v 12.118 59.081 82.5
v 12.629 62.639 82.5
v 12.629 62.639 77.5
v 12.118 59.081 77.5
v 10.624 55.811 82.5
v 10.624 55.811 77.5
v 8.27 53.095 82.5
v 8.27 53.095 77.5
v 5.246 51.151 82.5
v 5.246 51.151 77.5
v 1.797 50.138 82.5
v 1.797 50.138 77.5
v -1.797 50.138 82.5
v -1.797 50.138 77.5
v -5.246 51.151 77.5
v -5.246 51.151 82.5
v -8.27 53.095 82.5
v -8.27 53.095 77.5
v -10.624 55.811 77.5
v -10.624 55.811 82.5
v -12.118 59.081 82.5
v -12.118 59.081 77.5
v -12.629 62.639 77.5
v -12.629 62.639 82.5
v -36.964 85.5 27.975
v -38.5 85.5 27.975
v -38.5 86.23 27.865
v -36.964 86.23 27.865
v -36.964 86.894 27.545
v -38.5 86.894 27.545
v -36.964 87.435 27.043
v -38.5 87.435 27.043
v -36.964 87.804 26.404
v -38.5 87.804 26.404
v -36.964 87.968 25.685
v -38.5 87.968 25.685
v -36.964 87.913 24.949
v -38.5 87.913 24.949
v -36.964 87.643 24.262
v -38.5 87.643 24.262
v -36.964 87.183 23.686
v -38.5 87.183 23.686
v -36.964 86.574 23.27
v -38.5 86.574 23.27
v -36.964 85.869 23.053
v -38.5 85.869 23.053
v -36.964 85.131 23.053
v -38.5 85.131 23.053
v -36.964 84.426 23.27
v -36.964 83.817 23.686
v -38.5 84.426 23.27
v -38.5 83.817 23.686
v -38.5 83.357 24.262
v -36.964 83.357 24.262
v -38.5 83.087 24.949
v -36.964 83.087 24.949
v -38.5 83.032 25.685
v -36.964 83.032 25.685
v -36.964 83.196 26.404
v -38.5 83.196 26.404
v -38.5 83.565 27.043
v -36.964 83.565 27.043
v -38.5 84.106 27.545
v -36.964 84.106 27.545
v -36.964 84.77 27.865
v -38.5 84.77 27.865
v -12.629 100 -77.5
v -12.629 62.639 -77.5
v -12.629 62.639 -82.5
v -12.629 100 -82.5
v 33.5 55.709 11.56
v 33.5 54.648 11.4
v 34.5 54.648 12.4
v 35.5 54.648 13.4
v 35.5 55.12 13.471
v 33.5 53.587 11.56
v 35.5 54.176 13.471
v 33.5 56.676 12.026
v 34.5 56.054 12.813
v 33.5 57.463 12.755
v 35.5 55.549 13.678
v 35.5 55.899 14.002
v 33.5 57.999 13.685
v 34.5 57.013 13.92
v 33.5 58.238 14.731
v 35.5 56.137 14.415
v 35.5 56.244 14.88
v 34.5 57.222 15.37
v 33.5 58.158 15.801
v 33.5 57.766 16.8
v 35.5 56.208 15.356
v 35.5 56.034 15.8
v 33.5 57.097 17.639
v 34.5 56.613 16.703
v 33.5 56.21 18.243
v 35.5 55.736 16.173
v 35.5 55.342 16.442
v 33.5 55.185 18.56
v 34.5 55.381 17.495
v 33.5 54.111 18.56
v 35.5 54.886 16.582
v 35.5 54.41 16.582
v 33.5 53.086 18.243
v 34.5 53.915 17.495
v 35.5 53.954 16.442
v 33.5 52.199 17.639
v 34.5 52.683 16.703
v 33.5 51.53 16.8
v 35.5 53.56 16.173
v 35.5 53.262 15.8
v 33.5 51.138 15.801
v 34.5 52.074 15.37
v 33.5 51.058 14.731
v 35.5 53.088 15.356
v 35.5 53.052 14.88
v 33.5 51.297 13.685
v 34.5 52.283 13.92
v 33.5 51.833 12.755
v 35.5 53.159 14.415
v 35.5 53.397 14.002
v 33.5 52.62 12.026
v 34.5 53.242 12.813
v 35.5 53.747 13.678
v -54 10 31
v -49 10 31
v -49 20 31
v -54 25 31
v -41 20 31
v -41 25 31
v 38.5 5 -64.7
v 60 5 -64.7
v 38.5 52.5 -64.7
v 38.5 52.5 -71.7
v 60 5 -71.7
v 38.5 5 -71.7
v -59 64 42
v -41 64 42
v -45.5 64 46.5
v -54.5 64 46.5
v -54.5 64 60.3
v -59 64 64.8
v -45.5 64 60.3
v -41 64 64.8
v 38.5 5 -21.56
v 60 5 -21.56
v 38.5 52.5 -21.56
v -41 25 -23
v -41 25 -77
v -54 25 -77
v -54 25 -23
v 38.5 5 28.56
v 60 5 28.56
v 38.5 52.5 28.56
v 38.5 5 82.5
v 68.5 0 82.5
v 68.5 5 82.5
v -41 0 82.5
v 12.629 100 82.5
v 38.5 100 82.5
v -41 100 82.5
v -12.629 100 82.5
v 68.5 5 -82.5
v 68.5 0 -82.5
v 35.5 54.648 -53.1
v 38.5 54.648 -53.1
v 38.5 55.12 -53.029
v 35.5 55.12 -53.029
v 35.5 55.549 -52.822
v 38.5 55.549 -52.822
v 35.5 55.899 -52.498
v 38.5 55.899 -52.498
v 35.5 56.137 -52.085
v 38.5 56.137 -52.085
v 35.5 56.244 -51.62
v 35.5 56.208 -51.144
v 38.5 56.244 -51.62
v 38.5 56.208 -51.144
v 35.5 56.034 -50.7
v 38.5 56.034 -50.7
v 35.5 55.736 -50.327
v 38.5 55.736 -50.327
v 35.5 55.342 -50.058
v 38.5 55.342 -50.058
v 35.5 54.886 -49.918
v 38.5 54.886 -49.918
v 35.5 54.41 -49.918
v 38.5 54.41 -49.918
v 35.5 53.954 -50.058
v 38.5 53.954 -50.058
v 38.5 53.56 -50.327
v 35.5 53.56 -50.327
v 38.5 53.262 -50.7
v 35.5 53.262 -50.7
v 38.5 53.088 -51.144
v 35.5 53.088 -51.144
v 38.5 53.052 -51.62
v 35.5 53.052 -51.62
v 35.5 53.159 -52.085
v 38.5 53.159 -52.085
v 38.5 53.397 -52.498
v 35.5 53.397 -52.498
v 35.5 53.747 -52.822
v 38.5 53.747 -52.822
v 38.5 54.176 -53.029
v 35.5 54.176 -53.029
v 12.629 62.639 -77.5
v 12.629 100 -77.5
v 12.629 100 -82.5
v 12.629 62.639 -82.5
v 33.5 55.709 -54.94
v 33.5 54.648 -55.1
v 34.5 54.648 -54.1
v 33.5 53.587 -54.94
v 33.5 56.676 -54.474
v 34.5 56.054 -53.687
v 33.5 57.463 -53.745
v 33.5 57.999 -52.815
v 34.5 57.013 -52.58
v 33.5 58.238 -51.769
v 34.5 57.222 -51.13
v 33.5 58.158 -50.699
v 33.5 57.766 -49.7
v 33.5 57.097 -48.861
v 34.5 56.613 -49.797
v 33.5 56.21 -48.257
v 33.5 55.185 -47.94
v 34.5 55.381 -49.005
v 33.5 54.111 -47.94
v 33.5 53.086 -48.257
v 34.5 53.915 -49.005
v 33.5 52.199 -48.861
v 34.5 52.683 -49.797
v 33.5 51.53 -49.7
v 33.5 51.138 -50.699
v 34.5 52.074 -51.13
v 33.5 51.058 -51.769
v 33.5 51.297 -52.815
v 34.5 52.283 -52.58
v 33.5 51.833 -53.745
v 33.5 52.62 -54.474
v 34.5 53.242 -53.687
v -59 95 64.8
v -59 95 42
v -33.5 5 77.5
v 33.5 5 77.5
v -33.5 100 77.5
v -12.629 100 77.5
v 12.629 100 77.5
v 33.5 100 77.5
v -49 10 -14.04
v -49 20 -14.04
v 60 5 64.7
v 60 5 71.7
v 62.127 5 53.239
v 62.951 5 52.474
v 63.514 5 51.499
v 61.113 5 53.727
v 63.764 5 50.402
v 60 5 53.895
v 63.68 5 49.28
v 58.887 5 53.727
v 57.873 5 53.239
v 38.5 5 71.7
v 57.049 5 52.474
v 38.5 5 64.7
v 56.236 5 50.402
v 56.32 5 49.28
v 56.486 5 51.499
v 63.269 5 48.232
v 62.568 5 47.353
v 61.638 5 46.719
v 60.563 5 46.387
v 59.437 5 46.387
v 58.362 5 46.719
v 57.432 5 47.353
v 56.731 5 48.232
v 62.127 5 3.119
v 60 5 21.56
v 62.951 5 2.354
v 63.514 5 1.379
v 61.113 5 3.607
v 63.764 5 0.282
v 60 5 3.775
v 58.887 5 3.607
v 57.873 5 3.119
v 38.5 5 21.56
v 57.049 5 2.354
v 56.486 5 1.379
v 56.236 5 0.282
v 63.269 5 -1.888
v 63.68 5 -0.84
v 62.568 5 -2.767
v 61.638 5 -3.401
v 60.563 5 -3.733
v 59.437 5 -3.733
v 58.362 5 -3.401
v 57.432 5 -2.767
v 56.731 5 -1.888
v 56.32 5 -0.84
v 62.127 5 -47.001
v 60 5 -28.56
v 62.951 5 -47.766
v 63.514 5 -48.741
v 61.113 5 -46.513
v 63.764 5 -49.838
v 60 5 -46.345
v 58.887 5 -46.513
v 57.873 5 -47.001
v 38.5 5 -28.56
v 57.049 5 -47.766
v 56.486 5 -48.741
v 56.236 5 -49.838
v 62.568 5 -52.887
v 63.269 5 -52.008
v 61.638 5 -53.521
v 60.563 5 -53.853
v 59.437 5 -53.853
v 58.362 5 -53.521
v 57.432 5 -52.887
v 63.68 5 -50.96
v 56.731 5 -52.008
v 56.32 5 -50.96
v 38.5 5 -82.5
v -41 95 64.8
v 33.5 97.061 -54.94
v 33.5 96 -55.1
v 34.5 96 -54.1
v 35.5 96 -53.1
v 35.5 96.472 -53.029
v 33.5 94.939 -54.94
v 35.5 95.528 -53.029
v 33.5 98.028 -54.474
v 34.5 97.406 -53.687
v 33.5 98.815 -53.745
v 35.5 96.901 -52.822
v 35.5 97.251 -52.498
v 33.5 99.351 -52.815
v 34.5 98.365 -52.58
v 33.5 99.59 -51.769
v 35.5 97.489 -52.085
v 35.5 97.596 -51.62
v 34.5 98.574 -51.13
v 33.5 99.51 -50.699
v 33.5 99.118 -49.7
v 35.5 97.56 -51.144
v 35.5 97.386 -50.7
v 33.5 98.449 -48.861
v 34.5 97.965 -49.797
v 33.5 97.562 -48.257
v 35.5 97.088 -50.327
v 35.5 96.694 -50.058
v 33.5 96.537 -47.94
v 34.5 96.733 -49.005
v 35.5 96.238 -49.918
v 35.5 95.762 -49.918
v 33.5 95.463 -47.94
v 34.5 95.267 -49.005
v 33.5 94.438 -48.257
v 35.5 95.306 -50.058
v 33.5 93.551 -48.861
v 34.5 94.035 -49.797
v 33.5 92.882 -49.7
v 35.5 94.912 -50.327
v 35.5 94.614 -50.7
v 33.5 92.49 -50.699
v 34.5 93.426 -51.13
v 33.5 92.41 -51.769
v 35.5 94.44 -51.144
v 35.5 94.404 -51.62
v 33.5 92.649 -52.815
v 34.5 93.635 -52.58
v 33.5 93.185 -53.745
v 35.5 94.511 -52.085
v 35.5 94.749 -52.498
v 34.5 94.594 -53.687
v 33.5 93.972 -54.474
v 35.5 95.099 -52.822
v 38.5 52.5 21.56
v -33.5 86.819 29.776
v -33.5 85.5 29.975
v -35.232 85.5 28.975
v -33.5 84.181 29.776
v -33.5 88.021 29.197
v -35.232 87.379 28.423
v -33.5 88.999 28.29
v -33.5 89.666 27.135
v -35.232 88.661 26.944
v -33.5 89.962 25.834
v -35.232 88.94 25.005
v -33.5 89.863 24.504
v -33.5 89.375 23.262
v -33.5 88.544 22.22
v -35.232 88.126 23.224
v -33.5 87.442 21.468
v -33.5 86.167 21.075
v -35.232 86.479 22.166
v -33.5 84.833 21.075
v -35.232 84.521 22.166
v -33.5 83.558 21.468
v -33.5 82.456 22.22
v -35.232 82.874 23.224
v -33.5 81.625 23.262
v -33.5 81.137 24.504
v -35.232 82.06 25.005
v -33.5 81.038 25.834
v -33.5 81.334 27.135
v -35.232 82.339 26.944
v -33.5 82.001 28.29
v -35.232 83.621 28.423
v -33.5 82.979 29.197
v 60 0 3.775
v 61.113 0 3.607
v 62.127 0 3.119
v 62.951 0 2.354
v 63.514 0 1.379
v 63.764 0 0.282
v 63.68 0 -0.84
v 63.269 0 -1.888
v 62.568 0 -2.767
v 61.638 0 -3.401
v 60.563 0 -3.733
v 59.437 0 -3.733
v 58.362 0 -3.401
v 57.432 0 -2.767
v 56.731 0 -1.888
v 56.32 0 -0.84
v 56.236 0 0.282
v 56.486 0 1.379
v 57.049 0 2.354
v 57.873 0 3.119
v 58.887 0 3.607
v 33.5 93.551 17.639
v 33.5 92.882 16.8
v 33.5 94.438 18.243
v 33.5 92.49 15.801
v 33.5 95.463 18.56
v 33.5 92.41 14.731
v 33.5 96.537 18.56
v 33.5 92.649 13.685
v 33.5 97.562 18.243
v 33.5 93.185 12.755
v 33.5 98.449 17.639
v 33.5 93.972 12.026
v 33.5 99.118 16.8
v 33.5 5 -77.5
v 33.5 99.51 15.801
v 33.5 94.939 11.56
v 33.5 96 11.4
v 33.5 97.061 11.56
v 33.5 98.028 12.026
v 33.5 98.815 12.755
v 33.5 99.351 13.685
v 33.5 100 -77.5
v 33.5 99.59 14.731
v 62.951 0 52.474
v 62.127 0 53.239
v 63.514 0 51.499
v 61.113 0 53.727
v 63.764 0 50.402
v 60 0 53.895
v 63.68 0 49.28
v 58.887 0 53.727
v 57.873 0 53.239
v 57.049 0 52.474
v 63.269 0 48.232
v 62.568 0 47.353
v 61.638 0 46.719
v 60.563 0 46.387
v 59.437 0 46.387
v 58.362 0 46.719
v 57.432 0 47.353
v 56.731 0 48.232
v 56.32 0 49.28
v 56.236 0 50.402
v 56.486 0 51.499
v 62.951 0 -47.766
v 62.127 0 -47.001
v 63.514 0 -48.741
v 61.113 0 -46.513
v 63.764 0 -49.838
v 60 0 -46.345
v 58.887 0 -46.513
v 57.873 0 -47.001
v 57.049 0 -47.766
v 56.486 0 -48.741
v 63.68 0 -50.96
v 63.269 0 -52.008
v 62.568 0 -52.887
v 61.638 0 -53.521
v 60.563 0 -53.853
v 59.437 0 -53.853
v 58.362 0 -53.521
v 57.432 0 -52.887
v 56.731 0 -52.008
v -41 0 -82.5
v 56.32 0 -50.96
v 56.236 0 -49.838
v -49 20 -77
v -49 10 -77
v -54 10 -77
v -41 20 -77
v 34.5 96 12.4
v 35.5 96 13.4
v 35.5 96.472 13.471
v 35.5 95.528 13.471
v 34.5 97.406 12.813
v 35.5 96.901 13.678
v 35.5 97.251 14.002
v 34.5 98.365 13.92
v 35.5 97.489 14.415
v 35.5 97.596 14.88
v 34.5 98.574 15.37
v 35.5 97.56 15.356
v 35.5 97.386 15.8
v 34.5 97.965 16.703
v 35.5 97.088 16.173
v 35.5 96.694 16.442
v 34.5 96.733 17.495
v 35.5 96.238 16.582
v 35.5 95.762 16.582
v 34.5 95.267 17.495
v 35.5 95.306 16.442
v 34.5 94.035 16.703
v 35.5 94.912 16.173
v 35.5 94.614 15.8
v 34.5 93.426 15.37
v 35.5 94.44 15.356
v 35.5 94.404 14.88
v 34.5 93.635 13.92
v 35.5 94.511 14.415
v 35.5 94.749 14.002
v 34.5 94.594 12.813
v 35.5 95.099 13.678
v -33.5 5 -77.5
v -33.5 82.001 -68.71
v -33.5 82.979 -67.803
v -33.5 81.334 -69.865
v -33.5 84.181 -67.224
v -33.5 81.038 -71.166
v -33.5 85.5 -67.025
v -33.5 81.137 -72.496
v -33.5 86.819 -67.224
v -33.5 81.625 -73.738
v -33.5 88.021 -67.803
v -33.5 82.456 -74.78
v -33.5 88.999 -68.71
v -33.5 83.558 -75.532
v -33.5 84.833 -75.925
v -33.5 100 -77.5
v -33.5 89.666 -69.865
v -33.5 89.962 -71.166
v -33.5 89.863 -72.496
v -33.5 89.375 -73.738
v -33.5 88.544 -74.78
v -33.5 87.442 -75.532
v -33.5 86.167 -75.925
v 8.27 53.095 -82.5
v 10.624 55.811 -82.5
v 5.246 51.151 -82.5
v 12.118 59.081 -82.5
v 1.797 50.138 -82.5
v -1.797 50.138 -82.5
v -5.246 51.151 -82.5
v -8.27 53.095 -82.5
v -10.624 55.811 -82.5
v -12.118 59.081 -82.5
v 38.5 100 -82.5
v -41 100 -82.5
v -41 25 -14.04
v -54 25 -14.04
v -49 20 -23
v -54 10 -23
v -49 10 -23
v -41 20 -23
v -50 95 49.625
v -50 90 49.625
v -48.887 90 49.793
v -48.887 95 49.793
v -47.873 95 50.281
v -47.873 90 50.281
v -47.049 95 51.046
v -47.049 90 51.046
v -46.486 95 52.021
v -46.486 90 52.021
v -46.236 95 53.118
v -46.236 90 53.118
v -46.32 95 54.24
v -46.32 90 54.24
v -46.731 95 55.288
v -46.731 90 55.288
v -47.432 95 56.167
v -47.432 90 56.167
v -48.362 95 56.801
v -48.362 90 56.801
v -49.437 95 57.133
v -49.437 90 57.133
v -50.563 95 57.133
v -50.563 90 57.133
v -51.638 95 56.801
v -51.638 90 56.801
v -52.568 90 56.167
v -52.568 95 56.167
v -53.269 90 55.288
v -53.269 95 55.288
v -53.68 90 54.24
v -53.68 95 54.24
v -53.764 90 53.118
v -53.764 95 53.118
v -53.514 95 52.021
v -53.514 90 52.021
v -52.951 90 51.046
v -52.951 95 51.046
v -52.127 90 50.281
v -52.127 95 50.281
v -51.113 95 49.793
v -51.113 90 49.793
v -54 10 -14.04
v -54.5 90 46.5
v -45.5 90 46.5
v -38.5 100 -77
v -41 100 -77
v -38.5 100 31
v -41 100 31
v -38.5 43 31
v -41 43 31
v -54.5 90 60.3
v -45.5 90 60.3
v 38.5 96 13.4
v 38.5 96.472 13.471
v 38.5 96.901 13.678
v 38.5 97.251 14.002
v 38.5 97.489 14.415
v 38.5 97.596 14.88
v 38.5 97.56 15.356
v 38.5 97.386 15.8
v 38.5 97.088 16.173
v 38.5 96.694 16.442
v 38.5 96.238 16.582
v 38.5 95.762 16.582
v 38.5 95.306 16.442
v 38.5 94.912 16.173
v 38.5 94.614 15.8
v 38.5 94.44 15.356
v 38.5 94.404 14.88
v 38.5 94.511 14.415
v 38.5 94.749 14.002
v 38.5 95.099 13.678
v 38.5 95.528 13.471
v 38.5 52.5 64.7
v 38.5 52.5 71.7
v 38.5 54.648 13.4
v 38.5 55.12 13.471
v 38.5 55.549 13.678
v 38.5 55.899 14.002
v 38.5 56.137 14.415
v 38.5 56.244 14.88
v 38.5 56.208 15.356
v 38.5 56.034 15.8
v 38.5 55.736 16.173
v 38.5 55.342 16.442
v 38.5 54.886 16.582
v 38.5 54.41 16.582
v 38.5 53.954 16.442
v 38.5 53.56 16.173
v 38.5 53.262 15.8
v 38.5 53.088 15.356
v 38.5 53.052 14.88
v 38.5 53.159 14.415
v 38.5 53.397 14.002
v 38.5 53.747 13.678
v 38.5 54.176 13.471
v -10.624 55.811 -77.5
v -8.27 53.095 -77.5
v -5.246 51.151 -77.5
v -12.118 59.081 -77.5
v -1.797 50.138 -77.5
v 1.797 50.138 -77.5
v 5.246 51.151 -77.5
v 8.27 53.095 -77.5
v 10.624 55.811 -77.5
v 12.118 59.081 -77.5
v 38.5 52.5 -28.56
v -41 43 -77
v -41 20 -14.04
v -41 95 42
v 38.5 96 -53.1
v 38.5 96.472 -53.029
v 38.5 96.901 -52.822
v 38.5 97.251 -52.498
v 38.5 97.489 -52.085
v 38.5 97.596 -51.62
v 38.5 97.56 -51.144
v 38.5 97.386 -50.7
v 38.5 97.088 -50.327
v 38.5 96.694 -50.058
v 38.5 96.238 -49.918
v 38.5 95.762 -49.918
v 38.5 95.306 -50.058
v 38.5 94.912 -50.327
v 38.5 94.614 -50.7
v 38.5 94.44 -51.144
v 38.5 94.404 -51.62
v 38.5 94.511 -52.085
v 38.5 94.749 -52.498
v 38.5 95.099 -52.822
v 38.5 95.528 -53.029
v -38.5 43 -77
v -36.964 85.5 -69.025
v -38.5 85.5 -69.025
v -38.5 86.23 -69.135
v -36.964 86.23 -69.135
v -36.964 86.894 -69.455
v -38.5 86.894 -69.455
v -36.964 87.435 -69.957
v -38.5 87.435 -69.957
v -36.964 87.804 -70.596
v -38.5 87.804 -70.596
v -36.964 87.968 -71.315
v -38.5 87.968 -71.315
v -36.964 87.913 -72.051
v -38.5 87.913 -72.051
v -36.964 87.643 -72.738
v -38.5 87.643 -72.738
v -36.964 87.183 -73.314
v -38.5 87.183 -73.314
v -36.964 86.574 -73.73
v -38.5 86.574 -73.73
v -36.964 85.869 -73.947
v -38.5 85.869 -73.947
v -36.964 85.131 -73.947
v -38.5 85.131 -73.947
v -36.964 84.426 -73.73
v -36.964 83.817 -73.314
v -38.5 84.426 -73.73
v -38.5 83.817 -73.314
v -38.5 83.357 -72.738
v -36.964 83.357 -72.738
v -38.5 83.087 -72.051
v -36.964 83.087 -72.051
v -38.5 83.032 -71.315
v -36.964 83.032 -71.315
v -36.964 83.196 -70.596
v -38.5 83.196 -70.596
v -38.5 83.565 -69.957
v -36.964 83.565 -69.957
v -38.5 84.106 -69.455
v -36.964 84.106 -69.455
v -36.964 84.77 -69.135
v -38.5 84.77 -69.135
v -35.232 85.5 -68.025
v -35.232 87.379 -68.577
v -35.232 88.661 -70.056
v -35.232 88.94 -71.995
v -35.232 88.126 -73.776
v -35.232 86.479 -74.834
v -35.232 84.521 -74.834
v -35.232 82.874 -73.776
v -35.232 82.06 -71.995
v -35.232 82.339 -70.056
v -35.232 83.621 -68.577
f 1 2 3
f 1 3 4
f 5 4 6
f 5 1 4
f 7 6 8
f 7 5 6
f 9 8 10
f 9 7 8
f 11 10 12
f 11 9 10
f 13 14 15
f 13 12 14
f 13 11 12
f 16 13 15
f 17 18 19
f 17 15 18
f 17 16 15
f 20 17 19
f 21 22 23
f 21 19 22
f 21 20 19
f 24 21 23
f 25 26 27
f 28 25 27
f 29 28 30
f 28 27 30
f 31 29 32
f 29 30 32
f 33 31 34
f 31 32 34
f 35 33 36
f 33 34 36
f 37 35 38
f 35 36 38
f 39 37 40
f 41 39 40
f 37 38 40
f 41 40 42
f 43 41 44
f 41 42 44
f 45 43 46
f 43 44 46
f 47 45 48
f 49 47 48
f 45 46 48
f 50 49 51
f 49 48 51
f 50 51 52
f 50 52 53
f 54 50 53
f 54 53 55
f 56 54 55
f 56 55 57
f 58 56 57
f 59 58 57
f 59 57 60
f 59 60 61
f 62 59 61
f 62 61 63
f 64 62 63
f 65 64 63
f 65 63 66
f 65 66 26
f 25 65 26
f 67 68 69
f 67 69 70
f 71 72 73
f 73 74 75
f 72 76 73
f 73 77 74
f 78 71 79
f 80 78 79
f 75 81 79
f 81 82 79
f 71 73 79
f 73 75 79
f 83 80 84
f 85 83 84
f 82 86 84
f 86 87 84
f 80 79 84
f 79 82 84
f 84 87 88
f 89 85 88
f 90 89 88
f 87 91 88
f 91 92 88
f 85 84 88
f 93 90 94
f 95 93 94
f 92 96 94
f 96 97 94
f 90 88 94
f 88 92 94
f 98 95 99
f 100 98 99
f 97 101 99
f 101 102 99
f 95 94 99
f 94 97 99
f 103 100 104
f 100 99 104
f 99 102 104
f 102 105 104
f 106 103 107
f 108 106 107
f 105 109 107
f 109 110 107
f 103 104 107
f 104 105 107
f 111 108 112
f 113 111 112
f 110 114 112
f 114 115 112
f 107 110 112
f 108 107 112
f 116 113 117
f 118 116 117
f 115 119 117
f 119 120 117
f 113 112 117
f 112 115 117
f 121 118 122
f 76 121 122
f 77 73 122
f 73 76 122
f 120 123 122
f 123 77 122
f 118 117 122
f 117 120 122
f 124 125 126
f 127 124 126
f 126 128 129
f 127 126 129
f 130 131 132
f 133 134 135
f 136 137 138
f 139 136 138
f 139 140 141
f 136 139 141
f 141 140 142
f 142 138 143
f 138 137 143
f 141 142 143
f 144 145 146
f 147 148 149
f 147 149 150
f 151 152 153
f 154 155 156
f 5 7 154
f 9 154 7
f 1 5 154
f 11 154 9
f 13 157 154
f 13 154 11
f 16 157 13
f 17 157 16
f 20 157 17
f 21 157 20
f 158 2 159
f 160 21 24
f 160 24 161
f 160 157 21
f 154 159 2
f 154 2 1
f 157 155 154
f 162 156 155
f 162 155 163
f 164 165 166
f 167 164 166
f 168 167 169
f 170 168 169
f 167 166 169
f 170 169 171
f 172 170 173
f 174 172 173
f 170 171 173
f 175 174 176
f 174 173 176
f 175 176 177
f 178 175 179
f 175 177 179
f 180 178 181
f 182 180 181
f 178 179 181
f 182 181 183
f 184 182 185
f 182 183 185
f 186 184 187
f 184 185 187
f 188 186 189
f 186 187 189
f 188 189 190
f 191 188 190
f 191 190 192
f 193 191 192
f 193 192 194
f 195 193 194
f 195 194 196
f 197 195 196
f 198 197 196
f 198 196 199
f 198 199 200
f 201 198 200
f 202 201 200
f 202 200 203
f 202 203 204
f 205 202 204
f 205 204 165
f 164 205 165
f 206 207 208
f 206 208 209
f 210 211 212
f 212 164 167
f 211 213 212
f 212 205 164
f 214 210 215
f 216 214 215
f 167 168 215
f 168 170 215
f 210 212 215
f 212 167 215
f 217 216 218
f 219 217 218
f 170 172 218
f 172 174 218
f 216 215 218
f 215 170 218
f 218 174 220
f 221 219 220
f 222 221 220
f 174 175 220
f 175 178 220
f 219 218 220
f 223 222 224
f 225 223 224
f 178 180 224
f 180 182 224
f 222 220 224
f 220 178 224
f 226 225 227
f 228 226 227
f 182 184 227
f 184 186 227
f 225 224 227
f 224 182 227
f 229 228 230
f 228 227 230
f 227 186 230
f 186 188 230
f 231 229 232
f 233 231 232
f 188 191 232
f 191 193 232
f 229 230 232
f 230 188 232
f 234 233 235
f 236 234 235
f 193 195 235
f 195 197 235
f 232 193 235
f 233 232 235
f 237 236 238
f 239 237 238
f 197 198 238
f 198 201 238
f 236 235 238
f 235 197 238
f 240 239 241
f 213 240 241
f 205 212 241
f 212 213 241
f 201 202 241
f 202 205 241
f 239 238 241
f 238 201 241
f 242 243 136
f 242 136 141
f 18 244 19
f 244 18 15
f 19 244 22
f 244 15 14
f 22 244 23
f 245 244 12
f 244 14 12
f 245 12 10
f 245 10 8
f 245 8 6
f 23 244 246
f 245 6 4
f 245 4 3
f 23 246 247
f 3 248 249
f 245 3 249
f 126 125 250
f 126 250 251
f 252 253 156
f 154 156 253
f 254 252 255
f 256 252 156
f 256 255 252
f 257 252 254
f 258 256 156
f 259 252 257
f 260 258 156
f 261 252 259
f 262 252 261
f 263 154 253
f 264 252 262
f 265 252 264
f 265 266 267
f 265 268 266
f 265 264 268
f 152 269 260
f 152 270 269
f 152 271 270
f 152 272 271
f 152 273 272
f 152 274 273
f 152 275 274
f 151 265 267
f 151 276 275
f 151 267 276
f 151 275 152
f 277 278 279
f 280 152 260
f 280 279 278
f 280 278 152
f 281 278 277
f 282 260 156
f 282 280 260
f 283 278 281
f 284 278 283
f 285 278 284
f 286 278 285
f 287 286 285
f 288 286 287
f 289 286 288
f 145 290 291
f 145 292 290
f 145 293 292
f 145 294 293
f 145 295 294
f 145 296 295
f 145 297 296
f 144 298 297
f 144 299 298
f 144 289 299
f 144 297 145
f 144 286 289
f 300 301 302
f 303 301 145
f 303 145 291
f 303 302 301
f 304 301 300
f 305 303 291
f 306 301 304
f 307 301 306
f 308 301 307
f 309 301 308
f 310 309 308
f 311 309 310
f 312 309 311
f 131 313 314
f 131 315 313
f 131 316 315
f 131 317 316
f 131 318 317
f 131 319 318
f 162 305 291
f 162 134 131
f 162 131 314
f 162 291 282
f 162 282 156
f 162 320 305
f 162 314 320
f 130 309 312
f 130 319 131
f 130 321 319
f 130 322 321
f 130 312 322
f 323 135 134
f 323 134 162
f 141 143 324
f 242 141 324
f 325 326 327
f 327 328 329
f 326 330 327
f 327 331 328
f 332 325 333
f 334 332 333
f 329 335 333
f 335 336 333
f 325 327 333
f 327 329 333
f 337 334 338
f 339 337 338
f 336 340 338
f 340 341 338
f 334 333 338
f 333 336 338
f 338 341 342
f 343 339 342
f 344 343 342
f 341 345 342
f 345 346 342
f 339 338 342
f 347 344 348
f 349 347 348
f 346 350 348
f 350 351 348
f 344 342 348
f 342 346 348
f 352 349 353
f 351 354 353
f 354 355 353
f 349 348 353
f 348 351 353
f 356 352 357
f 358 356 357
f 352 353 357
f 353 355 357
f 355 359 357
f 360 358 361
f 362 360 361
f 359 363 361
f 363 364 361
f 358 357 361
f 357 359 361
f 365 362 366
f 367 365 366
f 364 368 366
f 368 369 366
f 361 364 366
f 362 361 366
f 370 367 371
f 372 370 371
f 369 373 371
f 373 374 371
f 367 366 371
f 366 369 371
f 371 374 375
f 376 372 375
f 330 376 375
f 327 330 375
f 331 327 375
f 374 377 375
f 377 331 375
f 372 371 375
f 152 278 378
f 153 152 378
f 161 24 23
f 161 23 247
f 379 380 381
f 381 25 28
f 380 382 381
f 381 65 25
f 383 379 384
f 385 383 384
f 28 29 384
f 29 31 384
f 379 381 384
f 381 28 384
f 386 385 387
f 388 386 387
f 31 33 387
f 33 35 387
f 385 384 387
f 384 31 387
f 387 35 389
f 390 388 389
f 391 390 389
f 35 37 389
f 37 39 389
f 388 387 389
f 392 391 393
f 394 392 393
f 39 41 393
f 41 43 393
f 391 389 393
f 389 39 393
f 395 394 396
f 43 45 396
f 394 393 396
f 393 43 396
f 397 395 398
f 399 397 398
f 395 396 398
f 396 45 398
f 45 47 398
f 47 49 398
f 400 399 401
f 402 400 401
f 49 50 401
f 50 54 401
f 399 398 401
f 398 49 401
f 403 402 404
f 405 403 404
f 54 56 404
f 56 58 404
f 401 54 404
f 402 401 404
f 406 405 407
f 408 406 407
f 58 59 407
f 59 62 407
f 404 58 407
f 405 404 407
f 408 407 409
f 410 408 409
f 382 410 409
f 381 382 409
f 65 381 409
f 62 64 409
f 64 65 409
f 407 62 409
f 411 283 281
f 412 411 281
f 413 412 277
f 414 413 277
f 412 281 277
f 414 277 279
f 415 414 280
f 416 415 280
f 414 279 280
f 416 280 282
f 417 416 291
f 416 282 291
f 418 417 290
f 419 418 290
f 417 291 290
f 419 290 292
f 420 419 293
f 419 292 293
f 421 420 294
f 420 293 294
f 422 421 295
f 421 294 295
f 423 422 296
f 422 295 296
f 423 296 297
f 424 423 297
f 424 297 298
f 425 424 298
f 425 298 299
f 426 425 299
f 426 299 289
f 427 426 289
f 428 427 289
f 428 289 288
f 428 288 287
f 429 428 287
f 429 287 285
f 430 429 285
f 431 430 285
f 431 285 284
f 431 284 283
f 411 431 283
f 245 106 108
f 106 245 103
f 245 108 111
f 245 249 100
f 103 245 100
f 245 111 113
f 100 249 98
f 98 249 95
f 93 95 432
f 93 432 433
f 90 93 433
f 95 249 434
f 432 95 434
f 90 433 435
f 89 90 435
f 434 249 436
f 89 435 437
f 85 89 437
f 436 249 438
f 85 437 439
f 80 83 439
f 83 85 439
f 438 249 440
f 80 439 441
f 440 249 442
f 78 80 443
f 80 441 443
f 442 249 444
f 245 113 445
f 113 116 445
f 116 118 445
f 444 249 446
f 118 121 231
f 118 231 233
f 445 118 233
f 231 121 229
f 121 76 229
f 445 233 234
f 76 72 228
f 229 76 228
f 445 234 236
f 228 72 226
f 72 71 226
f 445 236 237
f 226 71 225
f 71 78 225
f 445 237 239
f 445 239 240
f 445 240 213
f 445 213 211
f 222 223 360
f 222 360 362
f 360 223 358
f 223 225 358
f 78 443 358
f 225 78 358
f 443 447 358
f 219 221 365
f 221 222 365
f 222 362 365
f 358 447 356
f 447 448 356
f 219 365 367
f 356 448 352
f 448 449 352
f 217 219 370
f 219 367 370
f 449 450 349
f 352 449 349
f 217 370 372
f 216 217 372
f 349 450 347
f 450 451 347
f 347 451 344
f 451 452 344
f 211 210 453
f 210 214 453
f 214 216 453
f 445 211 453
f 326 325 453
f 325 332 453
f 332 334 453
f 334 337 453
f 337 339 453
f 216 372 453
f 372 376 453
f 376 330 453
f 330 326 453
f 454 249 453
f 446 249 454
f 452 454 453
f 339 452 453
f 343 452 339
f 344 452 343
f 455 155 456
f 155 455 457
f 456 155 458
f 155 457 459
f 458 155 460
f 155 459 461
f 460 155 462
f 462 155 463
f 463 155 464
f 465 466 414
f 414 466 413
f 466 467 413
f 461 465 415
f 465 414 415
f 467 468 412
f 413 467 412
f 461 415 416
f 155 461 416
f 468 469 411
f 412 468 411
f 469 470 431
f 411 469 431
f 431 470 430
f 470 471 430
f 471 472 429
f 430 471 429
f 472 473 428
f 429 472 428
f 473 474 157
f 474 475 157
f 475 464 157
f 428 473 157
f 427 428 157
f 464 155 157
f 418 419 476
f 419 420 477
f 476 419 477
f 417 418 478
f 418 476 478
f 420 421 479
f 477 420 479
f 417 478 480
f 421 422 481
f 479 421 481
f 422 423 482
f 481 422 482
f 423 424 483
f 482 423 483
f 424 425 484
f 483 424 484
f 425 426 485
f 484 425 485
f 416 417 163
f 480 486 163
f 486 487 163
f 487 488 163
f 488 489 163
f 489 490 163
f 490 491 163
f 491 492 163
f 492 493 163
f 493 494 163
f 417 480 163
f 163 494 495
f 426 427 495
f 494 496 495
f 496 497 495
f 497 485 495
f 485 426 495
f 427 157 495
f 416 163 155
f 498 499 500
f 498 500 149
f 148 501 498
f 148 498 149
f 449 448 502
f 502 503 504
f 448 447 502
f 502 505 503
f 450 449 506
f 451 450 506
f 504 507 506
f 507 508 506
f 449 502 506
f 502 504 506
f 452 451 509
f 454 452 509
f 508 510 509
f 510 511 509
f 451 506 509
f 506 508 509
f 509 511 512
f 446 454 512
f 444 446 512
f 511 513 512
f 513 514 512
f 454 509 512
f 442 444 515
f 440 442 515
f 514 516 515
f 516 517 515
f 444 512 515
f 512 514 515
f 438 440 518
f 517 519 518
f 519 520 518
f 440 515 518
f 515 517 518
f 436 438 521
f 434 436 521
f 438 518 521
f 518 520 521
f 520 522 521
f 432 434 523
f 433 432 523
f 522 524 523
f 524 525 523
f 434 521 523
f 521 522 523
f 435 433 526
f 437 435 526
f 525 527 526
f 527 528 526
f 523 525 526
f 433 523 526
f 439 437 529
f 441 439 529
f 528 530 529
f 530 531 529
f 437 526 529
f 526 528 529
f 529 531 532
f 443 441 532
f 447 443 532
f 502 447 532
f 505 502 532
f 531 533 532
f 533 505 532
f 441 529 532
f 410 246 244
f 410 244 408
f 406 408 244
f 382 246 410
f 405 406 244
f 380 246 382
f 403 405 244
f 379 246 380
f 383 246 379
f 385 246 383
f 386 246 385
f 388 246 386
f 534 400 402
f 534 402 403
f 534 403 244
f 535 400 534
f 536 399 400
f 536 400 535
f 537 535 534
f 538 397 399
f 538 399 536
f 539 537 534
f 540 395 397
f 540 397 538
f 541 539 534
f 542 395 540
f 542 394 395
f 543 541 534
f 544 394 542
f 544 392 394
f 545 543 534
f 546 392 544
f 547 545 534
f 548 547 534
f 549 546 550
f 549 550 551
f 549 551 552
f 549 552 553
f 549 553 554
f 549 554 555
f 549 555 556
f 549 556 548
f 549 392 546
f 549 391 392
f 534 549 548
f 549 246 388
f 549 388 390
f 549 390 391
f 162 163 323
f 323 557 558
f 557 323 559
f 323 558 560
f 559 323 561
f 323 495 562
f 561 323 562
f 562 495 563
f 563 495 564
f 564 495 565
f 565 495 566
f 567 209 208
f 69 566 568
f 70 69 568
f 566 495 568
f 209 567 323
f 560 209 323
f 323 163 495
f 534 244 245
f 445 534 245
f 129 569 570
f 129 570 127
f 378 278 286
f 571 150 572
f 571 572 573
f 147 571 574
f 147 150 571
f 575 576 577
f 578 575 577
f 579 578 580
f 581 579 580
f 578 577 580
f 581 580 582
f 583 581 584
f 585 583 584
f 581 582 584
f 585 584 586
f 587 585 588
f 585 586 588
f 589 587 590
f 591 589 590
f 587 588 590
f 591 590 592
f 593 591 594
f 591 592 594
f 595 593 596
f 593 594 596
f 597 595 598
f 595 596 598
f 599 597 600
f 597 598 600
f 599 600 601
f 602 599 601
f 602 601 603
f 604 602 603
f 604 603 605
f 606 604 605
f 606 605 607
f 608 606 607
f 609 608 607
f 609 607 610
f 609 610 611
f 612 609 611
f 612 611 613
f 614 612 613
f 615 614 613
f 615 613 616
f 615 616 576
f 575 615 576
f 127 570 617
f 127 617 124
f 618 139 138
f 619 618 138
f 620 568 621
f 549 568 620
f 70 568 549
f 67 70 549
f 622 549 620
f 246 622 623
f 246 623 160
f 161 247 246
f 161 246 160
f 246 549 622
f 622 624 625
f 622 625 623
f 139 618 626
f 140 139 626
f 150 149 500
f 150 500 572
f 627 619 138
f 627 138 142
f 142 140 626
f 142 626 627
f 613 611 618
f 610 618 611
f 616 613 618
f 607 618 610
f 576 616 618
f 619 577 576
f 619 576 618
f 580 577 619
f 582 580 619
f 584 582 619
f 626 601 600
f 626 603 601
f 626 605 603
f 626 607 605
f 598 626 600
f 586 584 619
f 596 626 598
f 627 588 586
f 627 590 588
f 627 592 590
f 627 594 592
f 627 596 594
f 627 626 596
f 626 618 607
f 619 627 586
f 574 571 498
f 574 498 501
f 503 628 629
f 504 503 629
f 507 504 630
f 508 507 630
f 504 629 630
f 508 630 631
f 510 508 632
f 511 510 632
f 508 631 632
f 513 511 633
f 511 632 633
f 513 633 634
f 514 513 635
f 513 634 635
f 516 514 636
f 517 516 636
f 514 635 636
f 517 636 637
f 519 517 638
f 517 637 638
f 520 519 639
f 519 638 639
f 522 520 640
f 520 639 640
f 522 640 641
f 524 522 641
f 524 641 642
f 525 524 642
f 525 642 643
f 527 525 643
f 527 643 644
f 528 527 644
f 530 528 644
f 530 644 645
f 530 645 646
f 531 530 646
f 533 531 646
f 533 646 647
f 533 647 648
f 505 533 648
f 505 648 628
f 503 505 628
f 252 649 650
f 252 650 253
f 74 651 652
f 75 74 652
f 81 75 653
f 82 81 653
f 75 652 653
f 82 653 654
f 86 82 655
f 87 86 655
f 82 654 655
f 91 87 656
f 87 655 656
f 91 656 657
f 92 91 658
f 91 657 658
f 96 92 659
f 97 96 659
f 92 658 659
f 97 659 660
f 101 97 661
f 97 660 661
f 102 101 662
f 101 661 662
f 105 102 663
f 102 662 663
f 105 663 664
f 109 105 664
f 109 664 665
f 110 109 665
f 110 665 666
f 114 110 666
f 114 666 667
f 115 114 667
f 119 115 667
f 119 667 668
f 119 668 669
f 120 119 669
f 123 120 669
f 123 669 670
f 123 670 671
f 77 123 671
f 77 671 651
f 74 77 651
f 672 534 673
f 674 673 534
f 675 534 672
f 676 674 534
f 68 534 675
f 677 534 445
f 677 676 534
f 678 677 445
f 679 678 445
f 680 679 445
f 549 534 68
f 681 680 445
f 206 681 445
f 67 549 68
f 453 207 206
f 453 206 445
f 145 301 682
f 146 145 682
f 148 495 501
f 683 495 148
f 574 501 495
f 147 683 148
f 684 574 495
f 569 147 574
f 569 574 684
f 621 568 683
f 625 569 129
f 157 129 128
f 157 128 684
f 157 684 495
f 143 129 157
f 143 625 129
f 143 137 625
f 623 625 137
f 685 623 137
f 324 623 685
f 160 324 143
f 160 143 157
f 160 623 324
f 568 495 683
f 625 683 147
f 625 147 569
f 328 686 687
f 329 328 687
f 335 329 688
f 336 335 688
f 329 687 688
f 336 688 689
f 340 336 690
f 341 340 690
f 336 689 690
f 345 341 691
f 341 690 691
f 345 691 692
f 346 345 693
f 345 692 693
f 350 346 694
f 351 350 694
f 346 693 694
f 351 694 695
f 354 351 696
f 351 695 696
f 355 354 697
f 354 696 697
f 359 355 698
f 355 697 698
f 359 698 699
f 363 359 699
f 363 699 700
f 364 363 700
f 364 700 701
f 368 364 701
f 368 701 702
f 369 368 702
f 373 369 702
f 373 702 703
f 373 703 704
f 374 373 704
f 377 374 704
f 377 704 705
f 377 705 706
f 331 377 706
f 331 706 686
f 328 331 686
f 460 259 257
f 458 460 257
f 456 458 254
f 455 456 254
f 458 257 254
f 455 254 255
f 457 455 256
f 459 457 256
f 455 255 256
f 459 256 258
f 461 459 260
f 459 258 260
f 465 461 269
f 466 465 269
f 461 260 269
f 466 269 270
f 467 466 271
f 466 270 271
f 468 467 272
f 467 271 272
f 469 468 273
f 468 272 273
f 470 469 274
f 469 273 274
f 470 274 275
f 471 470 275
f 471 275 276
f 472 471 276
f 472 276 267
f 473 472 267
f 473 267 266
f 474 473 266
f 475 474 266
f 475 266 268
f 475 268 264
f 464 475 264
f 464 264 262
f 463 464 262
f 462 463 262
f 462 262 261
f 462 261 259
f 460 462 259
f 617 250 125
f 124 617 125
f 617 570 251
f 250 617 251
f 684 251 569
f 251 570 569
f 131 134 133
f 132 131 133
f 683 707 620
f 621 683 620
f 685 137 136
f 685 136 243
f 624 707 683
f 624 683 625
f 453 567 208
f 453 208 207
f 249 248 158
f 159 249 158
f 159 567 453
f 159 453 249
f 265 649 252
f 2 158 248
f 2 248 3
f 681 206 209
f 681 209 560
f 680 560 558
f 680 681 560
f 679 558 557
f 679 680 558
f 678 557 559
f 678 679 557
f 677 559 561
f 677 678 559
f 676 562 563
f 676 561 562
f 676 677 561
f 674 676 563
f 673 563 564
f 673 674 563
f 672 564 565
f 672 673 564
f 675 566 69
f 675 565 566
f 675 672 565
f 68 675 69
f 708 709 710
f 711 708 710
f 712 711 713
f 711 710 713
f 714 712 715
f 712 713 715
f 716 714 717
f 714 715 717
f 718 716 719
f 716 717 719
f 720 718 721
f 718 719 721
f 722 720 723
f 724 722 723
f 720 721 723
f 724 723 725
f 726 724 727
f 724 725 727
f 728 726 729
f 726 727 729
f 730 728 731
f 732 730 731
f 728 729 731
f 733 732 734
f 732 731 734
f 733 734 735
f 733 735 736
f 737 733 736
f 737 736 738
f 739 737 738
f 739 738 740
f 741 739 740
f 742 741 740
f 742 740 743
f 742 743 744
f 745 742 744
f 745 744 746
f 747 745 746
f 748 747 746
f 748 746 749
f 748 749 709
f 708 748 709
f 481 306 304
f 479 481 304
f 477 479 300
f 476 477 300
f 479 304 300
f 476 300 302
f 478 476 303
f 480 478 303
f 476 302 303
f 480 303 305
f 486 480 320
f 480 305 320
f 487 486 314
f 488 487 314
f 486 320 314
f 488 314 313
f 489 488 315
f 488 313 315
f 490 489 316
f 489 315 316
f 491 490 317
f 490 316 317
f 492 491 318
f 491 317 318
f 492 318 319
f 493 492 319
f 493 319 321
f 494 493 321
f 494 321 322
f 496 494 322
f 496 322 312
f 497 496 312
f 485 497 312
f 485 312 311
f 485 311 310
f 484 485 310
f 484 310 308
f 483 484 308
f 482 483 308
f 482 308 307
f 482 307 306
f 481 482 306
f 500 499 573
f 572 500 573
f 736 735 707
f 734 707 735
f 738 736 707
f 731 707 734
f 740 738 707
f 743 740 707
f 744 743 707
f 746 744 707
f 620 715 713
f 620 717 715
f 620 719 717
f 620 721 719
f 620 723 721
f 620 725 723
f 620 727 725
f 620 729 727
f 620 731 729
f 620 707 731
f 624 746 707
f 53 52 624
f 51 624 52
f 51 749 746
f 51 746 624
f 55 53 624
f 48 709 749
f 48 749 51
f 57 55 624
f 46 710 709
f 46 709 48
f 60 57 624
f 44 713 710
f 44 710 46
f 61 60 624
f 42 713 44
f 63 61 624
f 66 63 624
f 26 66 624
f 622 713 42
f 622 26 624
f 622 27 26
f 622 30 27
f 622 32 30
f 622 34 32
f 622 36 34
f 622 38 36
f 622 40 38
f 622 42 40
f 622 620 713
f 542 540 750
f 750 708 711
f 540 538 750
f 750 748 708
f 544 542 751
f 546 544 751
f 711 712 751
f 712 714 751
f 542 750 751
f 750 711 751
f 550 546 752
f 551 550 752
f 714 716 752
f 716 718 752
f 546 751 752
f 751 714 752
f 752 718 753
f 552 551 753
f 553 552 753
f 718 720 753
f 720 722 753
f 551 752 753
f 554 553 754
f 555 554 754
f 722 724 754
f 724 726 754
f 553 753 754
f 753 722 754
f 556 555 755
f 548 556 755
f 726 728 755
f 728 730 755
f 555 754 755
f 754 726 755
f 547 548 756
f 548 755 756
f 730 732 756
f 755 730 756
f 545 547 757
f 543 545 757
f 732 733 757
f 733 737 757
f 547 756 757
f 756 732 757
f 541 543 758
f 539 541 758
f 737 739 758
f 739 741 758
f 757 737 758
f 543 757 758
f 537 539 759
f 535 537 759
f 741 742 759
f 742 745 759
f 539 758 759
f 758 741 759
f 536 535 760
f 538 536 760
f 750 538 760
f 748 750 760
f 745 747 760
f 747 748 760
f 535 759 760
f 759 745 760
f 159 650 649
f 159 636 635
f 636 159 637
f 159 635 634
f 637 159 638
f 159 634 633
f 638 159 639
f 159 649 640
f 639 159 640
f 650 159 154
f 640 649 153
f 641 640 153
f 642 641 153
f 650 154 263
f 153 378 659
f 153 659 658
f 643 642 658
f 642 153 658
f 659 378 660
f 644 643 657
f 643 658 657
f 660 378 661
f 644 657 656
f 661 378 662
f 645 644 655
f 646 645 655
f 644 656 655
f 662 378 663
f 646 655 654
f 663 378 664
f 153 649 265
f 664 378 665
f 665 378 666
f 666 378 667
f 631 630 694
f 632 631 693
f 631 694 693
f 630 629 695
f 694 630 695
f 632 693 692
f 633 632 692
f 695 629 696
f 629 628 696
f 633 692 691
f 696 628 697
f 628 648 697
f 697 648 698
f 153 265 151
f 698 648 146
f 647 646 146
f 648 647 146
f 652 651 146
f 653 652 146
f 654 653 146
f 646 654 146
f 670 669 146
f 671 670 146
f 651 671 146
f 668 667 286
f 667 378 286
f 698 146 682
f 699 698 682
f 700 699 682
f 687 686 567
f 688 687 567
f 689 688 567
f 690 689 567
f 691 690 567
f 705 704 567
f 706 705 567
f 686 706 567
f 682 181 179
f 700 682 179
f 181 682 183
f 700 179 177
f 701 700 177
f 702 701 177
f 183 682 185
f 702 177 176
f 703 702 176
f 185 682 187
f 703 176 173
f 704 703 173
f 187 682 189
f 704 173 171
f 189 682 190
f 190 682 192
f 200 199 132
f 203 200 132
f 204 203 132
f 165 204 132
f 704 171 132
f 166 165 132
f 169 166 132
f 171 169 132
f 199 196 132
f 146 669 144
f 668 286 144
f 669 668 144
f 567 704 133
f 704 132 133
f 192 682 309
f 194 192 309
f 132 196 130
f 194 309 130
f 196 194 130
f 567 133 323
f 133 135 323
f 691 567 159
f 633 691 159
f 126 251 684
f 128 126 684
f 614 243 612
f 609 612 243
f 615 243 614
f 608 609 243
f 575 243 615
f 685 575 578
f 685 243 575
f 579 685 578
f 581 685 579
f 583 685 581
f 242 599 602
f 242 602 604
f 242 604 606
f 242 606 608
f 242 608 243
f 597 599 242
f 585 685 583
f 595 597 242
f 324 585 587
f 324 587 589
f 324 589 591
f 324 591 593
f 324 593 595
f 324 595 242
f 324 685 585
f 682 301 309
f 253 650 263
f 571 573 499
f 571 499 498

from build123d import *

# Parameters (mm, degrees)
SKETCH1_W           = 77
SKETCH1_H           = 165
BOSS_EXTRUDE2_DEPTH = 100
SKETCH4_W           = 67
SKETCH4_H           = 155
CUT_EXTRUDE1_DEPTH  = 95
SKETCH7_W           = 165
SKETCH7_H           = 100
BOSS_EXTRUDE4_DEPTH = 2.5
SKETCH5_W           = 108
SKETCH5_H           = 85
CUT_EXTRUDE2_DEPTH  = 2.5
CUT_EXTRUDE3_REACH  = 152.782
SKETCH9_R           = 2.475
CUT_EXTRUDE4_DEPTH  = 198.24603925
SKETCH11_W          = 165
SKETCH11_H          = 5
BOSS_EXTRUDE5_DEPTH = 30
SKETCH12_R          = 3.775
CUT_EXTRUDE5_DEPTH  = 144.260252687
RIB2_REACH          = 164.054
SKETCH17_WALL_W     = 378.24664849
SKETCH17_WALL_H     = 7
RIB3_REACH          = 195.398
SKETCH18_WALL_W     = 440.934996724
SKETCH18_WALL_H     = 7
RIB5_REACH          = 195.398
SKETCH20_WALL_W     = 440.934996724
SKETCH20_WALL_H     = 7
RIB6_REACH          = 164.054
SKETCH19_WALL_W     = 378.24664849
SKETCH19_WALL_H     = 7
SKETCH21_W          = 108
SKETCH21_H          = 15
BOSS_EXTRUDE6_DEPTH = 13
CUT_EXTRUDE6_REACH  = 168.056
SKETCH23_W          = 8
SKETCH23_H          = 10
SKETCH24_W          = 22.8
SKETCH24_H          = 31
BOSS_EXTRUDE7_DEPTH = 18
CHAMFER1_SIZE       = 2
CHAMFER1_SIZE2      = 3.464101615
CHAMFER2_SIZE       = 2
CHAMFER2_SIZE2      = 3.464101615
SKETCH25_W          = 9
SKETCH25_H          = 13.8
CUT_EXTRUDE7_DEPTH  = 26
CUT_EXTRUDE8_REACH  = 141.995
SKETCH26_R          = 3.775
CUT_EXTRUDE10_REACH = 164.211
SKETCH28_R          = 1.6
CHAMFER3_SIZE       = 2
CHAMFER4_SIZE       = 2
CHAMFER5_SIZE       = 2
CHAMFER6_SIZE       = 2
CUT_EXTRUDE11_REACH = 132.857
SKETCH29_W          = 13
SKETCH29_H          = 8.959672406


with BuildPart() as part:
    # Sketch1 → Boss-Extrude2 (new body)
    with BuildSketch(Plane(origin=(0, 0, 0), x_dir=(1, 0, 0), z_dir=(0, 1, 0))):
        Rectangle(SKETCH1_W, SKETCH1_H)
    extrude(amount=BOSS_EXTRUDE2_DEPTH)

    # Sketch4 → Cut-Extrude1 (cut)
    with BuildSketch(Plane(origin=(0, 100, 0), x_dir=(1, 0, 0), z_dir=(0, 1, 0))):
        Rectangle(SKETCH4_W, SKETCH4_H)
    extrude(amount=-CUT_EXTRUDE1_DEPTH, mode=Mode.SUBTRACT)

    # Sketch7 → Boss-Extrude4 (add)
    with BuildSketch(Plane.ZY.offset(38.5)):
        with Locations((0, 50)):
            Rectangle(SKETCH7_W, SKETCH7_H)
    extrude(amount=BOSS_EXTRUDE4_DEPTH)

    # Sketch5 → Cut-Extrude2 (cut)
    with BuildSketch(Plane.ZY.offset(38.5)):
        with Locations((-23, 85.5)):
            Rectangle(SKETCH5_W, SKETCH5_H)
    extrude(amount=CUT_EXTRUDE2_DEPTH, mode=Mode.SUBTRACT)

    # Sketch9 → Cut-Extrude3 (cut, up to next)
    with BuildSketch(Plane.ZY.offset(38.5), mode=Mode.PRIVATE) as cut_extrude3_sk1:
        with Locations((-71.5, 85.5)):
            Circle(SKETCH9_R)
    cut_extrude3_tool1 = extrude(cut_extrude3_sk1.sketch, amount=-CUT_EXTRUDE3_REACH, mode=Mode.PRIVATE) & part.part
    # Sketch9 → Cut-Extrude3 (cut, up to next)
    with BuildSketch(Plane.ZY.offset(38.5), mode=Mode.PRIVATE) as cut_extrude3_sk2:
        with Locations((25.5, 85.5)):
            Circle(SKETCH9_R)
    cut_extrude3_tool2 = extrude(cut_extrude3_sk2.sketch, amount=-CUT_EXTRUDE3_REACH, mode=Mode.PRIVATE) & part.part
    add(cut_extrude3_tool1.solids().sort_by_distance((-38.5, 85.5, -71.5))[0], mode=Mode.SUBTRACT)
    add(cut_extrude3_tool2.solids().sort_by_distance((-38.5, 85.5, 25.5))[0], mode=Mode.SUBTRACT)

    # Sketch10 → Cut-Extrude4 (cut, through all)
    with BuildSketch(Plane.XY.offset(82.5)):
        with BuildLine():
            Line((12.62916064, 100), (12.62916064, 62.639075144))
            ThreePointArc((12.62916064, 62.639075144), (0, 50.009914504), (-12.62916064, 62.639075144))
            Line((-12.62916064, 62.639075144), (-12.62916064, 100))
            ThreePointArc((-12.62916064, 100), (0, 112.62916064), (12.62916064, 100))
        make_face()
    extrude(amount=-CUT_EXTRUDE4_DEPTH, mode=Mode.SUBTRACT)

    # Sketch11 → Boss-Extrude5 (add)
    with BuildSketch(Plane(origin=(38.5, 0, 0), x_dir=(0, 0, -1), z_dir=(1, 0, 0))):
        with Locations((0, 2.5)):
            Rectangle(SKETCH11_W, SKETCH11_H)
    extrude(amount=BOSS_EXTRUDE5_DEPTH)

    # Sketch12 → Cut-Extrude5 (cut, through all)
    with BuildSketch(Plane(origin=(0, 5, 0), x_dir=(1, 0, 0), z_dir=(0, 1, 0))):
        with Locations((60, 50.12)):
            Circle(SKETCH12_R)
        with Locations((60, 0)):
            Circle(SKETCH12_R)
        with Locations((60, -50.12)):
            Circle(SKETCH12_R)
    extrude(amount=-CUT_EXTRUDE5_DEPTH, mode=Mode.SUBTRACT)

    # Sketch17 wall → Rib2 (add, up to next)
    with BuildSketch(Plane(origin=(49.25, 28.75, 25.06), x_dir=(-0.412357398674, 0.911022159861, 0), z_dir=(-0.911022159861, -0.412357398674, 0)), mode=Mode.PRIVATE) as rib2_sk1:
        Rectangle(SKETCH17_WALL_W, SKETCH17_WALL_H)
    rib2_tool1 = extrude(rib2_sk1.sketch, amount=RIB2_REACH, mode=Mode.PRIVATE) - part.part
    add(rib2_tool1.solids().sort_by_distance((49.25, 28.75, 25.06))[0])

    # Sketch18 wall → Rib3 (add, up to next)
    with BuildSketch(Plane(origin=(49.25, 28.75, 68.2), x_dir=(0.412357398674, -0.911022159861, 0), z_dir=(0.911022159861, 0.412357398674, 0)), mode=Mode.PRIVATE) as rib3_sk1:
        Rectangle(SKETCH18_WALL_W, SKETCH18_WALL_H)
    rib3_tool1 = extrude(rib3_sk1.sketch, amount=-RIB3_REACH, mode=Mode.PRIVATE) - part.part
    add(rib3_tool1.solids().sort_by_distance((49.25, 28.75, 68.2))[0])

    # Sketch20 wall → Rib5 (add, up to next)
    with BuildSketch(Plane(origin=(49.25, 28.75, -68.2), x_dir=(-0.412357398674, 0.911022159861, 0), z_dir=(-0.911022159861, -0.412357398674, 0)), mode=Mode.PRIVATE) as rib5_sk1:
        Rectangle(SKETCH20_WALL_W, SKETCH20_WALL_H)
    rib5_tool1 = extrude(rib5_sk1.sketch, amount=RIB5_REACH, mode=Mode.PRIVATE) - part.part
    add(rib5_tool1.solids().sort_by_distance((49.25, 28.75, -68.2))[0])

    # Sketch19 wall → Rib6 (add, up to next)
    with BuildSketch(Plane(origin=(49.25, 28.75, -25.06), x_dir=(-0.412357398674, 0.911022159861, 0), z_dir=(-0.911022159861, -0.412357398674, 0)), mode=Mode.PRIVATE) as rib6_sk1:
        Rectangle(SKETCH19_WALL_W, SKETCH19_WALL_H)
    rib6_tool1 = extrude(rib6_sk1.sketch, amount=RIB6_REACH, mode=Mode.PRIVATE) - part.part
    add(rib6_tool1.solids().sort_by_distance((49.25, 28.75, -25.06))[0])

    # Sketch21 → Boss-Extrude6 (add)
    with BuildSketch(Plane.ZY.offset(41)):
        with Locations((-23, 17.5)):
            Rectangle(SKETCH21_W, SKETCH21_H)
    extrude(amount=BOSS_EXTRUDE6_DEPTH)

    # Sketch23 → Cut-Extrude6 (cut, up to next)
    with BuildSketch(Plane.XY.offset(31), mode=Mode.PRIVATE) as cut_extrude6_sk1:
        with Locations((-45, 15)):
            Rectangle(SKETCH23_W, SKETCH23_H)
    cut_extrude6_tool1 = extrude(cut_extrude6_sk1.sketch, amount=-CUT_EXTRUDE6_REACH, mode=Mode.PRIVATE) & part.part
    add(cut_extrude6_tool1.solids().sort_by_distance((-45, 15, 31))[0], mode=Mode.SUBTRACT)

    # Sketch24 → Boss-Extrude7 (add)
    with BuildSketch(Plane.ZY.offset(41)):
        with Locations((53.4, 79.5)):
            Rectangle(SKETCH24_W, SKETCH24_H)
    extrude(amount=BOSS_EXTRUDE7_DEPTH)

    # Chamfer1
    chamfer1_edges = [part.edges().sort_by_distance(p)[0] for p in [
        (-33.5, 85.5, 23.025),
    ]]
    chamfer1_side = [part.faces().sort_by_distance(p)[0] for p in [
        (-33.5, 52.413518032, 0.060275311),
    ]]
    chamfer(chamfer1_edges, length=CHAMFER1_SIZE, length2=CHAMFER1_SIZE2, reference=chamfer1_side[0])

    # Chamfer2
    chamfer2_edges = [part.edges().sort_by_distance(p)[0] for p in [
        (-33.5, 85.5, -73.975),
    ]]
    chamfer2_side = [part.faces().sort_by_distance(p)[0] for p in [
        (-33.5, 52.31484696, -0.015591471),
    ]]
    chamfer(chamfer2_edges, length=CHAMFER2_SIZE, length2=CHAMFER2_SIZE2, reference=chamfer2_side[0])

    # Sketch25 → Cut-Extrude7 (cut)
    with BuildSketch(Plane.XZ.offset(-64)):
        with Locations((-50, 53.4)):
            Rectangle(SKETCH25_W, SKETCH25_H)
    extrude(amount=-CUT_EXTRUDE7_DEPTH, mode=Mode.SUBTRACT)

    # Sketch26 → Cut-Extrude8 (cut, up to next)
    with BuildSketch(Plane.XZ.offset(-90), mode=Mode.PRIVATE) as cut_extrude8_sk1:
        with Locations((-50, 53.4)):
            Circle(SKETCH26_R)
    cut_extrude8_tool1 = extrude(cut_extrude8_sk1.sketch, amount=-CUT_EXTRUDE8_REACH, mode=Mode.PRIVATE) & part.part
    add(cut_extrude8_tool1.solids().sort_by_distance((-50, 90, 53.4))[0], mode=Mode.SUBTRACT)

    # Sketch28 → Cut-Extrude10 (cut, up to next)
    with BuildSketch(Plane(origin=(38.5, 0, 0), x_dir=(0, 0, -1), z_dir=(1, 0, 0)), mode=Mode.PRIVATE) as cut_extrude10_sk1:
        with Locations((-15, 96)):
            Circle(SKETCH28_R)
    cut_extrude10_tool1 = extrude(cut_extrude10_sk1.sketch, amount=-CUT_EXTRUDE10_REACH, mode=Mode.PRIVATE) & part.part
    # Sketch28 → Cut-Extrude10 (cut, up to next)
    with BuildSketch(Plane(origin=(38.5, 0, 0), x_dir=(0, 0, -1), z_dir=(1, 0, 0)), mode=Mode.PRIVATE) as cut_extrude10_sk2:
        with Locations((-15, 54.648)):
            Circle(SKETCH28_R)
    cut_extrude10_tool2 = extrude(cut_extrude10_sk2.sketch, amount=-CUT_EXTRUDE10_REACH, mode=Mode.PRIVATE) & part.part
    # Sketch28 → Cut-Extrude10 (cut, up to next)
    with BuildSketch(Plane(origin=(38.5, 0, 0), x_dir=(0, 0, -1), z_dir=(1, 0, 0)), mode=Mode.PRIVATE) as cut_extrude10_sk3:
        with Locations((51.5, 96)):
            Circle(SKETCH28_R)
    cut_extrude10_tool3 = extrude(cut_extrude10_sk3.sketch, amount=-CUT_EXTRUDE10_REACH, mode=Mode.PRIVATE) & part.part
    # Sketch28 → Cut-Extrude10 (cut, up to next)
    with BuildSketch(Plane(origin=(38.5, 0, 0), x_dir=(0, 0, -1), z_dir=(1, 0, 0)), mode=Mode.PRIVATE) as cut_extrude10_sk4:
        with Locations((51.5, 54.648)):
            Circle(SKETCH28_R)
    cut_extrude10_tool4 = extrude(cut_extrude10_sk4.sketch, amount=-CUT_EXTRUDE10_REACH, mode=Mode.PRIVATE) & part.part
    add(cut_extrude10_tool1.solids().sort_by_distance((38.5, 96, 15))[0], mode=Mode.SUBTRACT)
    add(cut_extrude10_tool2.solids().sort_by_distance((38.5, 54.648, 15))[0], mode=Mode.SUBTRACT)
    add(cut_extrude10_tool3.solids().sort_by_distance((38.5, 96, -51.5))[0], mode=Mode.SUBTRACT)
    add(cut_extrude10_tool4.solids().sort_by_distance((38.5, 54.648, -51.5))[0], mode=Mode.SUBTRACT)

    # Chamfer3
    chamfer3_edges = [part.edges().sort_by_distance(p)[0] for p in [
        (33.5, 96, 16.6),
    ]]
    chamfer(chamfer3_edges, length=CHAMFER3_SIZE)

    # Chamfer4
    chamfer4_edges = [part.edges().sort_by_distance(p)[0] for p in [
        (33.5, 54.648, 16.6),
    ]]
    chamfer(chamfer4_edges, length=CHAMFER4_SIZE)

    # Chamfer5
    chamfer5_edges = [part.edges().sort_by_distance(p)[0] for p in [
        (33.5, 96, -49.9),
    ]]
    chamfer(chamfer5_edges, length=CHAMFER5_SIZE)

    # Chamfer6
    chamfer6_edges = [part.edges().sort_by_distance(p)[0] for p in [
        (33.5, 54.648, -49.9),
    ]]
    chamfer(chamfer6_edges, length=CHAMFER6_SIZE)

    # Sketch29 → Cut-Extrude11 (cut, up to next)
    with BuildSketch(Plane(origin=(0, 25, 0), x_dir=(1, 0, 0), z_dir=(0, 1, 0)), mode=Mode.PRIVATE) as cut_extrude11_sk1:
        with Locations((-47.5, 18.520163797)):
            Rectangle(SKETCH29_W, SKETCH29_H)
    cut_extrude11_tool1 = extrude(cut_extrude11_sk1.sketch, amount=-CUT_EXTRUDE11_REACH, mode=Mode.PRIVATE) & part.part
    add(cut_extrude11_tool1.solids().sort_by_distance((-47.5, 25, -18.520164))[0], mode=Mode.SUBTRACT)


solid = part.part
